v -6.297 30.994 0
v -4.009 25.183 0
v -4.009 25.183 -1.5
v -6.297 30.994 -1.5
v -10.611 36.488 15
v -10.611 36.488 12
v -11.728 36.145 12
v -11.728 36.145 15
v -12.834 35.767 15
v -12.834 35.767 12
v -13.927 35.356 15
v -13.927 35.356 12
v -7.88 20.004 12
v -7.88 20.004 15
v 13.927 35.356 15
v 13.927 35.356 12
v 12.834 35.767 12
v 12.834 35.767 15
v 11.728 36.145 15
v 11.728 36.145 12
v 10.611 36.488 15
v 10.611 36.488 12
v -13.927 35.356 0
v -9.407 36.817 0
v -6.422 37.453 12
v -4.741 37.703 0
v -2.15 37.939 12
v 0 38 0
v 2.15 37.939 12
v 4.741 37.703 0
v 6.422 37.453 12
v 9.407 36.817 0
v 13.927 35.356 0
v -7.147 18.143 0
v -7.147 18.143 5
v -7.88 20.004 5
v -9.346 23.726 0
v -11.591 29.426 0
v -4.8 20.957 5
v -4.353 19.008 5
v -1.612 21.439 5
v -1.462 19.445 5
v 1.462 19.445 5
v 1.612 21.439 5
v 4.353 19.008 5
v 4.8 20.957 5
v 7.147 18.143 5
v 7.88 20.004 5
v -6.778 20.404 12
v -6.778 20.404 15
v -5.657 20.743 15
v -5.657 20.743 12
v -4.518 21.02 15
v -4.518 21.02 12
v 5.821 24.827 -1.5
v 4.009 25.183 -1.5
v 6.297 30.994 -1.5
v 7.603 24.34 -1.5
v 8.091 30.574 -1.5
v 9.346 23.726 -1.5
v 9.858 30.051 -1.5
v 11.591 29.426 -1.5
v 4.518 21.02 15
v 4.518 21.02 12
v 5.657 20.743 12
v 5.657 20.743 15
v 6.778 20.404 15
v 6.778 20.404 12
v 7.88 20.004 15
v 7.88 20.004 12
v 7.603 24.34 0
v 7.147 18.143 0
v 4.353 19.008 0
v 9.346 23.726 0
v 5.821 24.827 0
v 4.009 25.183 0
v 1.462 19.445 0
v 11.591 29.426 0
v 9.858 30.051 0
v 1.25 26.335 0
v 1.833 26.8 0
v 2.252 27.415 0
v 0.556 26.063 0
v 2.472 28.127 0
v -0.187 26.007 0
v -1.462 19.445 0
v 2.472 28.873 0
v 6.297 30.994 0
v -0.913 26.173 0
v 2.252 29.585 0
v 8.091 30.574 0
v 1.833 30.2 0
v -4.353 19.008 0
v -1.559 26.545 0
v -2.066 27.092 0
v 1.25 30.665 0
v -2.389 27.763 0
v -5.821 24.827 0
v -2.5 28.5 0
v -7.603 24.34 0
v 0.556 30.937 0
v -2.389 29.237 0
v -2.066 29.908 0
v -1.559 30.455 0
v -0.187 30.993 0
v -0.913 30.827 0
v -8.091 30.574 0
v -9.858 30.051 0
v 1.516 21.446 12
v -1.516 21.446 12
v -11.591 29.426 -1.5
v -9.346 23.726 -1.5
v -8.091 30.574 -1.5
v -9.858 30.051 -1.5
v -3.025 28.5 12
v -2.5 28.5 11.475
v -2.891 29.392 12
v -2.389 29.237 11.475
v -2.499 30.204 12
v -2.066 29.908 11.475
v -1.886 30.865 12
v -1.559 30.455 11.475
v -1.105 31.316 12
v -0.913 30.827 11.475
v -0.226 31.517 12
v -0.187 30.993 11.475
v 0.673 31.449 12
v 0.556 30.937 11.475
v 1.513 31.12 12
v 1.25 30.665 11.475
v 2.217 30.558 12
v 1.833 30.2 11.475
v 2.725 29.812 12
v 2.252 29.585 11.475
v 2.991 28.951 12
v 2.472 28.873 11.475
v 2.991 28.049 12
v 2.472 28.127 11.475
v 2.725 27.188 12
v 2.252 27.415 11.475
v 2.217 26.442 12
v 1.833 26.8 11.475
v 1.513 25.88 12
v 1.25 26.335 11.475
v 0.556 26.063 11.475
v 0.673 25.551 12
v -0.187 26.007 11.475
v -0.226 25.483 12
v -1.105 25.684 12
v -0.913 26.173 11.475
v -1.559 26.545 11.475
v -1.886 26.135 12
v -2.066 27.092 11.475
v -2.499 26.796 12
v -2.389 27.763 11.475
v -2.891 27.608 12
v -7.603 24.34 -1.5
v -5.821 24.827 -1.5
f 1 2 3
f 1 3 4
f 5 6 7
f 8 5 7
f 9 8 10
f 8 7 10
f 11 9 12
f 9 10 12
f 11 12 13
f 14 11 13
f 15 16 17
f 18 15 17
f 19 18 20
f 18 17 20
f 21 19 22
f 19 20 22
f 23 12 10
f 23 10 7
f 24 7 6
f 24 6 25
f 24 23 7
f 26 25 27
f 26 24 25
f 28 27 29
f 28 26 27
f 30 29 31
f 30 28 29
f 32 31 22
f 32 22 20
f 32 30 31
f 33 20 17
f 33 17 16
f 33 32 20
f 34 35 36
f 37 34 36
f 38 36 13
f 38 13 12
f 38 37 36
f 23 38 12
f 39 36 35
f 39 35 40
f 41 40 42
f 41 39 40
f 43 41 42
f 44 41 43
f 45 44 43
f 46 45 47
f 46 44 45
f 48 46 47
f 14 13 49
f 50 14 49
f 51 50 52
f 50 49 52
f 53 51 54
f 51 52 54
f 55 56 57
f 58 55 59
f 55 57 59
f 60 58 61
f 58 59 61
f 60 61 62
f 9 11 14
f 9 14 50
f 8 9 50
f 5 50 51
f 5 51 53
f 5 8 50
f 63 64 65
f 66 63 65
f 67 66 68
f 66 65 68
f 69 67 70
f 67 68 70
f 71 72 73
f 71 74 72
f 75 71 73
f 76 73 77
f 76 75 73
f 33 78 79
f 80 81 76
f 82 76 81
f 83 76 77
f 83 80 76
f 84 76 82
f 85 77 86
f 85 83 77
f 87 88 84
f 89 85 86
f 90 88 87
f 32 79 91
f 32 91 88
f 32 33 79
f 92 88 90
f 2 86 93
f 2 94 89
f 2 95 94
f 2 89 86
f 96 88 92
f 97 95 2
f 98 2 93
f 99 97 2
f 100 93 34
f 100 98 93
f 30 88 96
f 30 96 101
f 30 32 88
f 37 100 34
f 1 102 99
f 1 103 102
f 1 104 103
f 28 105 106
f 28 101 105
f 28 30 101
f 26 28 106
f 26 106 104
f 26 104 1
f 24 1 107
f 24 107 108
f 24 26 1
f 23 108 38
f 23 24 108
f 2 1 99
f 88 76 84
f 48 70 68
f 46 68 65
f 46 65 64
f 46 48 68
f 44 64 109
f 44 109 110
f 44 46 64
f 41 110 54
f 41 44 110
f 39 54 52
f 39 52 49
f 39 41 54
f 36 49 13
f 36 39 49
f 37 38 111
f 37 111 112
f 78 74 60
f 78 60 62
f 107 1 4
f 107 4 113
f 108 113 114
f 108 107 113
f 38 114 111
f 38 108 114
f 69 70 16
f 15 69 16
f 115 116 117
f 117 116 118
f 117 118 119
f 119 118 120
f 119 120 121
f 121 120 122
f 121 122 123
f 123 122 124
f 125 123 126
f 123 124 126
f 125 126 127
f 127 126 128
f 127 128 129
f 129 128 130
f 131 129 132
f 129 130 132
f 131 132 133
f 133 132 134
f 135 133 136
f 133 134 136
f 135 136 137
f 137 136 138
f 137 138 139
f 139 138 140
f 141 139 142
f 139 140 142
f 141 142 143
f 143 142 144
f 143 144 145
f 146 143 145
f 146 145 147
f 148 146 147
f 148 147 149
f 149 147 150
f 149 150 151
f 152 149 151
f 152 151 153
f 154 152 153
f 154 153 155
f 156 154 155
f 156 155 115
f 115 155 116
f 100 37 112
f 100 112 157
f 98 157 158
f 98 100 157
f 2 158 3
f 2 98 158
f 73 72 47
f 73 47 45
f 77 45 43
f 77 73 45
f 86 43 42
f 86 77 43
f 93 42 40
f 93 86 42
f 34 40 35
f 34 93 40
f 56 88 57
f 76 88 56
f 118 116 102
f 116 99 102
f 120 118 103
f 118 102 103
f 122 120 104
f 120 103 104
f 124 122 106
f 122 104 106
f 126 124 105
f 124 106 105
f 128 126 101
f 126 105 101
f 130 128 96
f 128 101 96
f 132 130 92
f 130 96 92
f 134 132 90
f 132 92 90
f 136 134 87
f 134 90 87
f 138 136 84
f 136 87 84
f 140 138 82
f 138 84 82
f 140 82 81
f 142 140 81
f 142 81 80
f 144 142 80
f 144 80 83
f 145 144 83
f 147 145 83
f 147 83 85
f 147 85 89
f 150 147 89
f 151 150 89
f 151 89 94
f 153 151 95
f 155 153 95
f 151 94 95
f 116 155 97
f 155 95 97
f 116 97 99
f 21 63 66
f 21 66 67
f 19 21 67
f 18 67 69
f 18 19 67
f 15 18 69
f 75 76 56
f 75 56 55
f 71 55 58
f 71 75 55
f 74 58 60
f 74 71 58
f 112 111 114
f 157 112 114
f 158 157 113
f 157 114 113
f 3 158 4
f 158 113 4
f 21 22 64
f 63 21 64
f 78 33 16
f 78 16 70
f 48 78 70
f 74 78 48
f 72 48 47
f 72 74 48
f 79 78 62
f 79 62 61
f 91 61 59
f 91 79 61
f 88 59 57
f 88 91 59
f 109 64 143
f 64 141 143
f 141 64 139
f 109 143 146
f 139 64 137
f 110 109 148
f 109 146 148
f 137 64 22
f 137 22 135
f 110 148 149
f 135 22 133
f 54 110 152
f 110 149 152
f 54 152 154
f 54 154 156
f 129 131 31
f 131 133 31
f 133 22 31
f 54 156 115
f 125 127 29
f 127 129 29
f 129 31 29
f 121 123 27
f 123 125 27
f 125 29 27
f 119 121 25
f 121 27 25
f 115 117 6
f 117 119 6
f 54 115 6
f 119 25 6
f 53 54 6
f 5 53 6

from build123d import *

# Parameters (mm, degrees)
BOSS_EXTRU_1_DEPTH          = 12
ENL_V_START                 = -7
ENL_V_MAT_EXTRU_1_DEPTH     = 7
BOSS_EXTRU_2_DEPTH          = 3
BOSS_EXTRU_3_DEPTH          = 1.5
TROU_TARAUD_M61_D           = 5
TROU_TARAUD_M61_CSINK_D     = 6.05
TROU_TARAUD_M61_CSINK_ANGLE = 90


with BuildPart() as part:
    # Esquisse2 → Boss.-Extru.1 (new body)
    with BuildSketch(Plane.XY):
        with BuildLine():
            Line((-7.146773921, 18.143142576), (-13.927046616, 35.355867583))
            ThreePointArc((-13.927046616, 35.355867583), (0, 38), (13.927046616, 35.355867583))
            Line((13.927046616, 35.355867583), (7.146773921, 18.143142576))
            ThreePointArc((7.146773921, 18.143142576), (0, 19.5), (-7.146773921, 18.143142576))
        make_face()
    extrude(amount=BOSS_EXTRU_1_DEPTH)

    # Esquisse4 → Enlèv. mat.-Extru.1 (cut)
    with BuildSketch(Plane.XY.offset(12).offset(ENL_V_START)):
        with BuildLine():
            Line((-7.879776375, 20.003977712), (-7.146773921, 18.143142576))
            ThreePointArc((-7.146773921, 18.143142576), (0, 19.5), (7.146773921, 18.143142576))
            Line((7.146773921, 18.143142576), (7.879776375, 20.003977712))
            ThreePointArc((7.879776375, 20.003977712), (0, 21.5), (-7.879776375, 20.003977712))
        make_face()
    extrude(amount=ENL_V_MAT_EXTRU_1_DEPTH, mode=Mode.SUBTRACT)

    # Esquisse5 → Boss.-Extru.2 (add)
    with BuildSketch(Plane.XY.offset(12)):
        with BuildLine():
            Line((-13.927046616, 35.355867583), (-7.879776375, 20.003977712))
            ThreePointArc((-7.879776375, 20.003977712), (-6.219766636, 20.580682763), (-4.518203594, 21.019891443))
            Line((-4.518203594, 21.019891443), (-10.611385095, 36.488333839))
            ThreePointArc((-10.611385095, 36.488333839), (-12.282274938, 35.960335404), (-13.927046616, 35.355867583))
        make_face()
        with BuildLine():
            Line((7.879776375, 20.003977712), (13.927046616, 35.355867583))
            ThreePointArc((13.927046616, 35.355867583), (12.282274938, 35.960335404), (10.611385095, 36.488333839))
            Line((10.611385095, 36.488333839), (4.518203594, 21.019891443))
            ThreePointArc((4.518203594, 21.019891443), (6.219766636, 20.580682763), (7.879776375, 20.003977712))
        make_face()
    extrude(amount=BOSS_EXTRU_2_DEPTH)

    # Esquisse6 → Boss.-Extru.3 (add)
    with BuildSketch(Plane(origin=(0, 0, 0), x_dir=(-1, 0, 0), z_dir=(0, 0, -1))):
        with BuildLine():
            Line((11.591313455, 29.42626351), (9.345781281, 23.725647984))
            ThreePointArc((9.345781281, 23.725647984), (6.716786511, 24.599487372), (4.008510327, 25.182967358))
            Line((4.008510327, 25.182967358), (6.297398832, 30.993649345))
            ThreePointArc((6.297398832, 30.993649345), (8.978623581, 30.325696206), (11.591313455, 29.42626351))
        make_face()
        with BuildLine():
            Line((-9.345781281, 23.725647984), (-11.591313455, 29.42626351))
            ThreePointArc((-11.591313455, 29.42626351), (-8.978623581, 30.325696206), (-6.297398832, 30.993649345))
            Line((-6.297398832, 30.993649345), (-4.008510327, 25.182967358))
            ThreePointArc((-4.008510327, 25.182967358), (-6.716786511, 24.599487372), (-9.345781281, 23.725647984))
        make_face()
    extrude(amount=BOSS_EXTRU_3_DEPTH)

    # Trou taraudé M61 (through all)
    with Locations(Plane.XY.offset(12)):
        with Locations((0, 28.5)):
            CounterSinkHole(TROU_TARAUD_M61_D / 2, TROU_TARAUD_M61_CSINK_D / 2, counter_sink_angle=TROU_TARAUD_M61_CSINK_ANGLE)


solid = part.part
